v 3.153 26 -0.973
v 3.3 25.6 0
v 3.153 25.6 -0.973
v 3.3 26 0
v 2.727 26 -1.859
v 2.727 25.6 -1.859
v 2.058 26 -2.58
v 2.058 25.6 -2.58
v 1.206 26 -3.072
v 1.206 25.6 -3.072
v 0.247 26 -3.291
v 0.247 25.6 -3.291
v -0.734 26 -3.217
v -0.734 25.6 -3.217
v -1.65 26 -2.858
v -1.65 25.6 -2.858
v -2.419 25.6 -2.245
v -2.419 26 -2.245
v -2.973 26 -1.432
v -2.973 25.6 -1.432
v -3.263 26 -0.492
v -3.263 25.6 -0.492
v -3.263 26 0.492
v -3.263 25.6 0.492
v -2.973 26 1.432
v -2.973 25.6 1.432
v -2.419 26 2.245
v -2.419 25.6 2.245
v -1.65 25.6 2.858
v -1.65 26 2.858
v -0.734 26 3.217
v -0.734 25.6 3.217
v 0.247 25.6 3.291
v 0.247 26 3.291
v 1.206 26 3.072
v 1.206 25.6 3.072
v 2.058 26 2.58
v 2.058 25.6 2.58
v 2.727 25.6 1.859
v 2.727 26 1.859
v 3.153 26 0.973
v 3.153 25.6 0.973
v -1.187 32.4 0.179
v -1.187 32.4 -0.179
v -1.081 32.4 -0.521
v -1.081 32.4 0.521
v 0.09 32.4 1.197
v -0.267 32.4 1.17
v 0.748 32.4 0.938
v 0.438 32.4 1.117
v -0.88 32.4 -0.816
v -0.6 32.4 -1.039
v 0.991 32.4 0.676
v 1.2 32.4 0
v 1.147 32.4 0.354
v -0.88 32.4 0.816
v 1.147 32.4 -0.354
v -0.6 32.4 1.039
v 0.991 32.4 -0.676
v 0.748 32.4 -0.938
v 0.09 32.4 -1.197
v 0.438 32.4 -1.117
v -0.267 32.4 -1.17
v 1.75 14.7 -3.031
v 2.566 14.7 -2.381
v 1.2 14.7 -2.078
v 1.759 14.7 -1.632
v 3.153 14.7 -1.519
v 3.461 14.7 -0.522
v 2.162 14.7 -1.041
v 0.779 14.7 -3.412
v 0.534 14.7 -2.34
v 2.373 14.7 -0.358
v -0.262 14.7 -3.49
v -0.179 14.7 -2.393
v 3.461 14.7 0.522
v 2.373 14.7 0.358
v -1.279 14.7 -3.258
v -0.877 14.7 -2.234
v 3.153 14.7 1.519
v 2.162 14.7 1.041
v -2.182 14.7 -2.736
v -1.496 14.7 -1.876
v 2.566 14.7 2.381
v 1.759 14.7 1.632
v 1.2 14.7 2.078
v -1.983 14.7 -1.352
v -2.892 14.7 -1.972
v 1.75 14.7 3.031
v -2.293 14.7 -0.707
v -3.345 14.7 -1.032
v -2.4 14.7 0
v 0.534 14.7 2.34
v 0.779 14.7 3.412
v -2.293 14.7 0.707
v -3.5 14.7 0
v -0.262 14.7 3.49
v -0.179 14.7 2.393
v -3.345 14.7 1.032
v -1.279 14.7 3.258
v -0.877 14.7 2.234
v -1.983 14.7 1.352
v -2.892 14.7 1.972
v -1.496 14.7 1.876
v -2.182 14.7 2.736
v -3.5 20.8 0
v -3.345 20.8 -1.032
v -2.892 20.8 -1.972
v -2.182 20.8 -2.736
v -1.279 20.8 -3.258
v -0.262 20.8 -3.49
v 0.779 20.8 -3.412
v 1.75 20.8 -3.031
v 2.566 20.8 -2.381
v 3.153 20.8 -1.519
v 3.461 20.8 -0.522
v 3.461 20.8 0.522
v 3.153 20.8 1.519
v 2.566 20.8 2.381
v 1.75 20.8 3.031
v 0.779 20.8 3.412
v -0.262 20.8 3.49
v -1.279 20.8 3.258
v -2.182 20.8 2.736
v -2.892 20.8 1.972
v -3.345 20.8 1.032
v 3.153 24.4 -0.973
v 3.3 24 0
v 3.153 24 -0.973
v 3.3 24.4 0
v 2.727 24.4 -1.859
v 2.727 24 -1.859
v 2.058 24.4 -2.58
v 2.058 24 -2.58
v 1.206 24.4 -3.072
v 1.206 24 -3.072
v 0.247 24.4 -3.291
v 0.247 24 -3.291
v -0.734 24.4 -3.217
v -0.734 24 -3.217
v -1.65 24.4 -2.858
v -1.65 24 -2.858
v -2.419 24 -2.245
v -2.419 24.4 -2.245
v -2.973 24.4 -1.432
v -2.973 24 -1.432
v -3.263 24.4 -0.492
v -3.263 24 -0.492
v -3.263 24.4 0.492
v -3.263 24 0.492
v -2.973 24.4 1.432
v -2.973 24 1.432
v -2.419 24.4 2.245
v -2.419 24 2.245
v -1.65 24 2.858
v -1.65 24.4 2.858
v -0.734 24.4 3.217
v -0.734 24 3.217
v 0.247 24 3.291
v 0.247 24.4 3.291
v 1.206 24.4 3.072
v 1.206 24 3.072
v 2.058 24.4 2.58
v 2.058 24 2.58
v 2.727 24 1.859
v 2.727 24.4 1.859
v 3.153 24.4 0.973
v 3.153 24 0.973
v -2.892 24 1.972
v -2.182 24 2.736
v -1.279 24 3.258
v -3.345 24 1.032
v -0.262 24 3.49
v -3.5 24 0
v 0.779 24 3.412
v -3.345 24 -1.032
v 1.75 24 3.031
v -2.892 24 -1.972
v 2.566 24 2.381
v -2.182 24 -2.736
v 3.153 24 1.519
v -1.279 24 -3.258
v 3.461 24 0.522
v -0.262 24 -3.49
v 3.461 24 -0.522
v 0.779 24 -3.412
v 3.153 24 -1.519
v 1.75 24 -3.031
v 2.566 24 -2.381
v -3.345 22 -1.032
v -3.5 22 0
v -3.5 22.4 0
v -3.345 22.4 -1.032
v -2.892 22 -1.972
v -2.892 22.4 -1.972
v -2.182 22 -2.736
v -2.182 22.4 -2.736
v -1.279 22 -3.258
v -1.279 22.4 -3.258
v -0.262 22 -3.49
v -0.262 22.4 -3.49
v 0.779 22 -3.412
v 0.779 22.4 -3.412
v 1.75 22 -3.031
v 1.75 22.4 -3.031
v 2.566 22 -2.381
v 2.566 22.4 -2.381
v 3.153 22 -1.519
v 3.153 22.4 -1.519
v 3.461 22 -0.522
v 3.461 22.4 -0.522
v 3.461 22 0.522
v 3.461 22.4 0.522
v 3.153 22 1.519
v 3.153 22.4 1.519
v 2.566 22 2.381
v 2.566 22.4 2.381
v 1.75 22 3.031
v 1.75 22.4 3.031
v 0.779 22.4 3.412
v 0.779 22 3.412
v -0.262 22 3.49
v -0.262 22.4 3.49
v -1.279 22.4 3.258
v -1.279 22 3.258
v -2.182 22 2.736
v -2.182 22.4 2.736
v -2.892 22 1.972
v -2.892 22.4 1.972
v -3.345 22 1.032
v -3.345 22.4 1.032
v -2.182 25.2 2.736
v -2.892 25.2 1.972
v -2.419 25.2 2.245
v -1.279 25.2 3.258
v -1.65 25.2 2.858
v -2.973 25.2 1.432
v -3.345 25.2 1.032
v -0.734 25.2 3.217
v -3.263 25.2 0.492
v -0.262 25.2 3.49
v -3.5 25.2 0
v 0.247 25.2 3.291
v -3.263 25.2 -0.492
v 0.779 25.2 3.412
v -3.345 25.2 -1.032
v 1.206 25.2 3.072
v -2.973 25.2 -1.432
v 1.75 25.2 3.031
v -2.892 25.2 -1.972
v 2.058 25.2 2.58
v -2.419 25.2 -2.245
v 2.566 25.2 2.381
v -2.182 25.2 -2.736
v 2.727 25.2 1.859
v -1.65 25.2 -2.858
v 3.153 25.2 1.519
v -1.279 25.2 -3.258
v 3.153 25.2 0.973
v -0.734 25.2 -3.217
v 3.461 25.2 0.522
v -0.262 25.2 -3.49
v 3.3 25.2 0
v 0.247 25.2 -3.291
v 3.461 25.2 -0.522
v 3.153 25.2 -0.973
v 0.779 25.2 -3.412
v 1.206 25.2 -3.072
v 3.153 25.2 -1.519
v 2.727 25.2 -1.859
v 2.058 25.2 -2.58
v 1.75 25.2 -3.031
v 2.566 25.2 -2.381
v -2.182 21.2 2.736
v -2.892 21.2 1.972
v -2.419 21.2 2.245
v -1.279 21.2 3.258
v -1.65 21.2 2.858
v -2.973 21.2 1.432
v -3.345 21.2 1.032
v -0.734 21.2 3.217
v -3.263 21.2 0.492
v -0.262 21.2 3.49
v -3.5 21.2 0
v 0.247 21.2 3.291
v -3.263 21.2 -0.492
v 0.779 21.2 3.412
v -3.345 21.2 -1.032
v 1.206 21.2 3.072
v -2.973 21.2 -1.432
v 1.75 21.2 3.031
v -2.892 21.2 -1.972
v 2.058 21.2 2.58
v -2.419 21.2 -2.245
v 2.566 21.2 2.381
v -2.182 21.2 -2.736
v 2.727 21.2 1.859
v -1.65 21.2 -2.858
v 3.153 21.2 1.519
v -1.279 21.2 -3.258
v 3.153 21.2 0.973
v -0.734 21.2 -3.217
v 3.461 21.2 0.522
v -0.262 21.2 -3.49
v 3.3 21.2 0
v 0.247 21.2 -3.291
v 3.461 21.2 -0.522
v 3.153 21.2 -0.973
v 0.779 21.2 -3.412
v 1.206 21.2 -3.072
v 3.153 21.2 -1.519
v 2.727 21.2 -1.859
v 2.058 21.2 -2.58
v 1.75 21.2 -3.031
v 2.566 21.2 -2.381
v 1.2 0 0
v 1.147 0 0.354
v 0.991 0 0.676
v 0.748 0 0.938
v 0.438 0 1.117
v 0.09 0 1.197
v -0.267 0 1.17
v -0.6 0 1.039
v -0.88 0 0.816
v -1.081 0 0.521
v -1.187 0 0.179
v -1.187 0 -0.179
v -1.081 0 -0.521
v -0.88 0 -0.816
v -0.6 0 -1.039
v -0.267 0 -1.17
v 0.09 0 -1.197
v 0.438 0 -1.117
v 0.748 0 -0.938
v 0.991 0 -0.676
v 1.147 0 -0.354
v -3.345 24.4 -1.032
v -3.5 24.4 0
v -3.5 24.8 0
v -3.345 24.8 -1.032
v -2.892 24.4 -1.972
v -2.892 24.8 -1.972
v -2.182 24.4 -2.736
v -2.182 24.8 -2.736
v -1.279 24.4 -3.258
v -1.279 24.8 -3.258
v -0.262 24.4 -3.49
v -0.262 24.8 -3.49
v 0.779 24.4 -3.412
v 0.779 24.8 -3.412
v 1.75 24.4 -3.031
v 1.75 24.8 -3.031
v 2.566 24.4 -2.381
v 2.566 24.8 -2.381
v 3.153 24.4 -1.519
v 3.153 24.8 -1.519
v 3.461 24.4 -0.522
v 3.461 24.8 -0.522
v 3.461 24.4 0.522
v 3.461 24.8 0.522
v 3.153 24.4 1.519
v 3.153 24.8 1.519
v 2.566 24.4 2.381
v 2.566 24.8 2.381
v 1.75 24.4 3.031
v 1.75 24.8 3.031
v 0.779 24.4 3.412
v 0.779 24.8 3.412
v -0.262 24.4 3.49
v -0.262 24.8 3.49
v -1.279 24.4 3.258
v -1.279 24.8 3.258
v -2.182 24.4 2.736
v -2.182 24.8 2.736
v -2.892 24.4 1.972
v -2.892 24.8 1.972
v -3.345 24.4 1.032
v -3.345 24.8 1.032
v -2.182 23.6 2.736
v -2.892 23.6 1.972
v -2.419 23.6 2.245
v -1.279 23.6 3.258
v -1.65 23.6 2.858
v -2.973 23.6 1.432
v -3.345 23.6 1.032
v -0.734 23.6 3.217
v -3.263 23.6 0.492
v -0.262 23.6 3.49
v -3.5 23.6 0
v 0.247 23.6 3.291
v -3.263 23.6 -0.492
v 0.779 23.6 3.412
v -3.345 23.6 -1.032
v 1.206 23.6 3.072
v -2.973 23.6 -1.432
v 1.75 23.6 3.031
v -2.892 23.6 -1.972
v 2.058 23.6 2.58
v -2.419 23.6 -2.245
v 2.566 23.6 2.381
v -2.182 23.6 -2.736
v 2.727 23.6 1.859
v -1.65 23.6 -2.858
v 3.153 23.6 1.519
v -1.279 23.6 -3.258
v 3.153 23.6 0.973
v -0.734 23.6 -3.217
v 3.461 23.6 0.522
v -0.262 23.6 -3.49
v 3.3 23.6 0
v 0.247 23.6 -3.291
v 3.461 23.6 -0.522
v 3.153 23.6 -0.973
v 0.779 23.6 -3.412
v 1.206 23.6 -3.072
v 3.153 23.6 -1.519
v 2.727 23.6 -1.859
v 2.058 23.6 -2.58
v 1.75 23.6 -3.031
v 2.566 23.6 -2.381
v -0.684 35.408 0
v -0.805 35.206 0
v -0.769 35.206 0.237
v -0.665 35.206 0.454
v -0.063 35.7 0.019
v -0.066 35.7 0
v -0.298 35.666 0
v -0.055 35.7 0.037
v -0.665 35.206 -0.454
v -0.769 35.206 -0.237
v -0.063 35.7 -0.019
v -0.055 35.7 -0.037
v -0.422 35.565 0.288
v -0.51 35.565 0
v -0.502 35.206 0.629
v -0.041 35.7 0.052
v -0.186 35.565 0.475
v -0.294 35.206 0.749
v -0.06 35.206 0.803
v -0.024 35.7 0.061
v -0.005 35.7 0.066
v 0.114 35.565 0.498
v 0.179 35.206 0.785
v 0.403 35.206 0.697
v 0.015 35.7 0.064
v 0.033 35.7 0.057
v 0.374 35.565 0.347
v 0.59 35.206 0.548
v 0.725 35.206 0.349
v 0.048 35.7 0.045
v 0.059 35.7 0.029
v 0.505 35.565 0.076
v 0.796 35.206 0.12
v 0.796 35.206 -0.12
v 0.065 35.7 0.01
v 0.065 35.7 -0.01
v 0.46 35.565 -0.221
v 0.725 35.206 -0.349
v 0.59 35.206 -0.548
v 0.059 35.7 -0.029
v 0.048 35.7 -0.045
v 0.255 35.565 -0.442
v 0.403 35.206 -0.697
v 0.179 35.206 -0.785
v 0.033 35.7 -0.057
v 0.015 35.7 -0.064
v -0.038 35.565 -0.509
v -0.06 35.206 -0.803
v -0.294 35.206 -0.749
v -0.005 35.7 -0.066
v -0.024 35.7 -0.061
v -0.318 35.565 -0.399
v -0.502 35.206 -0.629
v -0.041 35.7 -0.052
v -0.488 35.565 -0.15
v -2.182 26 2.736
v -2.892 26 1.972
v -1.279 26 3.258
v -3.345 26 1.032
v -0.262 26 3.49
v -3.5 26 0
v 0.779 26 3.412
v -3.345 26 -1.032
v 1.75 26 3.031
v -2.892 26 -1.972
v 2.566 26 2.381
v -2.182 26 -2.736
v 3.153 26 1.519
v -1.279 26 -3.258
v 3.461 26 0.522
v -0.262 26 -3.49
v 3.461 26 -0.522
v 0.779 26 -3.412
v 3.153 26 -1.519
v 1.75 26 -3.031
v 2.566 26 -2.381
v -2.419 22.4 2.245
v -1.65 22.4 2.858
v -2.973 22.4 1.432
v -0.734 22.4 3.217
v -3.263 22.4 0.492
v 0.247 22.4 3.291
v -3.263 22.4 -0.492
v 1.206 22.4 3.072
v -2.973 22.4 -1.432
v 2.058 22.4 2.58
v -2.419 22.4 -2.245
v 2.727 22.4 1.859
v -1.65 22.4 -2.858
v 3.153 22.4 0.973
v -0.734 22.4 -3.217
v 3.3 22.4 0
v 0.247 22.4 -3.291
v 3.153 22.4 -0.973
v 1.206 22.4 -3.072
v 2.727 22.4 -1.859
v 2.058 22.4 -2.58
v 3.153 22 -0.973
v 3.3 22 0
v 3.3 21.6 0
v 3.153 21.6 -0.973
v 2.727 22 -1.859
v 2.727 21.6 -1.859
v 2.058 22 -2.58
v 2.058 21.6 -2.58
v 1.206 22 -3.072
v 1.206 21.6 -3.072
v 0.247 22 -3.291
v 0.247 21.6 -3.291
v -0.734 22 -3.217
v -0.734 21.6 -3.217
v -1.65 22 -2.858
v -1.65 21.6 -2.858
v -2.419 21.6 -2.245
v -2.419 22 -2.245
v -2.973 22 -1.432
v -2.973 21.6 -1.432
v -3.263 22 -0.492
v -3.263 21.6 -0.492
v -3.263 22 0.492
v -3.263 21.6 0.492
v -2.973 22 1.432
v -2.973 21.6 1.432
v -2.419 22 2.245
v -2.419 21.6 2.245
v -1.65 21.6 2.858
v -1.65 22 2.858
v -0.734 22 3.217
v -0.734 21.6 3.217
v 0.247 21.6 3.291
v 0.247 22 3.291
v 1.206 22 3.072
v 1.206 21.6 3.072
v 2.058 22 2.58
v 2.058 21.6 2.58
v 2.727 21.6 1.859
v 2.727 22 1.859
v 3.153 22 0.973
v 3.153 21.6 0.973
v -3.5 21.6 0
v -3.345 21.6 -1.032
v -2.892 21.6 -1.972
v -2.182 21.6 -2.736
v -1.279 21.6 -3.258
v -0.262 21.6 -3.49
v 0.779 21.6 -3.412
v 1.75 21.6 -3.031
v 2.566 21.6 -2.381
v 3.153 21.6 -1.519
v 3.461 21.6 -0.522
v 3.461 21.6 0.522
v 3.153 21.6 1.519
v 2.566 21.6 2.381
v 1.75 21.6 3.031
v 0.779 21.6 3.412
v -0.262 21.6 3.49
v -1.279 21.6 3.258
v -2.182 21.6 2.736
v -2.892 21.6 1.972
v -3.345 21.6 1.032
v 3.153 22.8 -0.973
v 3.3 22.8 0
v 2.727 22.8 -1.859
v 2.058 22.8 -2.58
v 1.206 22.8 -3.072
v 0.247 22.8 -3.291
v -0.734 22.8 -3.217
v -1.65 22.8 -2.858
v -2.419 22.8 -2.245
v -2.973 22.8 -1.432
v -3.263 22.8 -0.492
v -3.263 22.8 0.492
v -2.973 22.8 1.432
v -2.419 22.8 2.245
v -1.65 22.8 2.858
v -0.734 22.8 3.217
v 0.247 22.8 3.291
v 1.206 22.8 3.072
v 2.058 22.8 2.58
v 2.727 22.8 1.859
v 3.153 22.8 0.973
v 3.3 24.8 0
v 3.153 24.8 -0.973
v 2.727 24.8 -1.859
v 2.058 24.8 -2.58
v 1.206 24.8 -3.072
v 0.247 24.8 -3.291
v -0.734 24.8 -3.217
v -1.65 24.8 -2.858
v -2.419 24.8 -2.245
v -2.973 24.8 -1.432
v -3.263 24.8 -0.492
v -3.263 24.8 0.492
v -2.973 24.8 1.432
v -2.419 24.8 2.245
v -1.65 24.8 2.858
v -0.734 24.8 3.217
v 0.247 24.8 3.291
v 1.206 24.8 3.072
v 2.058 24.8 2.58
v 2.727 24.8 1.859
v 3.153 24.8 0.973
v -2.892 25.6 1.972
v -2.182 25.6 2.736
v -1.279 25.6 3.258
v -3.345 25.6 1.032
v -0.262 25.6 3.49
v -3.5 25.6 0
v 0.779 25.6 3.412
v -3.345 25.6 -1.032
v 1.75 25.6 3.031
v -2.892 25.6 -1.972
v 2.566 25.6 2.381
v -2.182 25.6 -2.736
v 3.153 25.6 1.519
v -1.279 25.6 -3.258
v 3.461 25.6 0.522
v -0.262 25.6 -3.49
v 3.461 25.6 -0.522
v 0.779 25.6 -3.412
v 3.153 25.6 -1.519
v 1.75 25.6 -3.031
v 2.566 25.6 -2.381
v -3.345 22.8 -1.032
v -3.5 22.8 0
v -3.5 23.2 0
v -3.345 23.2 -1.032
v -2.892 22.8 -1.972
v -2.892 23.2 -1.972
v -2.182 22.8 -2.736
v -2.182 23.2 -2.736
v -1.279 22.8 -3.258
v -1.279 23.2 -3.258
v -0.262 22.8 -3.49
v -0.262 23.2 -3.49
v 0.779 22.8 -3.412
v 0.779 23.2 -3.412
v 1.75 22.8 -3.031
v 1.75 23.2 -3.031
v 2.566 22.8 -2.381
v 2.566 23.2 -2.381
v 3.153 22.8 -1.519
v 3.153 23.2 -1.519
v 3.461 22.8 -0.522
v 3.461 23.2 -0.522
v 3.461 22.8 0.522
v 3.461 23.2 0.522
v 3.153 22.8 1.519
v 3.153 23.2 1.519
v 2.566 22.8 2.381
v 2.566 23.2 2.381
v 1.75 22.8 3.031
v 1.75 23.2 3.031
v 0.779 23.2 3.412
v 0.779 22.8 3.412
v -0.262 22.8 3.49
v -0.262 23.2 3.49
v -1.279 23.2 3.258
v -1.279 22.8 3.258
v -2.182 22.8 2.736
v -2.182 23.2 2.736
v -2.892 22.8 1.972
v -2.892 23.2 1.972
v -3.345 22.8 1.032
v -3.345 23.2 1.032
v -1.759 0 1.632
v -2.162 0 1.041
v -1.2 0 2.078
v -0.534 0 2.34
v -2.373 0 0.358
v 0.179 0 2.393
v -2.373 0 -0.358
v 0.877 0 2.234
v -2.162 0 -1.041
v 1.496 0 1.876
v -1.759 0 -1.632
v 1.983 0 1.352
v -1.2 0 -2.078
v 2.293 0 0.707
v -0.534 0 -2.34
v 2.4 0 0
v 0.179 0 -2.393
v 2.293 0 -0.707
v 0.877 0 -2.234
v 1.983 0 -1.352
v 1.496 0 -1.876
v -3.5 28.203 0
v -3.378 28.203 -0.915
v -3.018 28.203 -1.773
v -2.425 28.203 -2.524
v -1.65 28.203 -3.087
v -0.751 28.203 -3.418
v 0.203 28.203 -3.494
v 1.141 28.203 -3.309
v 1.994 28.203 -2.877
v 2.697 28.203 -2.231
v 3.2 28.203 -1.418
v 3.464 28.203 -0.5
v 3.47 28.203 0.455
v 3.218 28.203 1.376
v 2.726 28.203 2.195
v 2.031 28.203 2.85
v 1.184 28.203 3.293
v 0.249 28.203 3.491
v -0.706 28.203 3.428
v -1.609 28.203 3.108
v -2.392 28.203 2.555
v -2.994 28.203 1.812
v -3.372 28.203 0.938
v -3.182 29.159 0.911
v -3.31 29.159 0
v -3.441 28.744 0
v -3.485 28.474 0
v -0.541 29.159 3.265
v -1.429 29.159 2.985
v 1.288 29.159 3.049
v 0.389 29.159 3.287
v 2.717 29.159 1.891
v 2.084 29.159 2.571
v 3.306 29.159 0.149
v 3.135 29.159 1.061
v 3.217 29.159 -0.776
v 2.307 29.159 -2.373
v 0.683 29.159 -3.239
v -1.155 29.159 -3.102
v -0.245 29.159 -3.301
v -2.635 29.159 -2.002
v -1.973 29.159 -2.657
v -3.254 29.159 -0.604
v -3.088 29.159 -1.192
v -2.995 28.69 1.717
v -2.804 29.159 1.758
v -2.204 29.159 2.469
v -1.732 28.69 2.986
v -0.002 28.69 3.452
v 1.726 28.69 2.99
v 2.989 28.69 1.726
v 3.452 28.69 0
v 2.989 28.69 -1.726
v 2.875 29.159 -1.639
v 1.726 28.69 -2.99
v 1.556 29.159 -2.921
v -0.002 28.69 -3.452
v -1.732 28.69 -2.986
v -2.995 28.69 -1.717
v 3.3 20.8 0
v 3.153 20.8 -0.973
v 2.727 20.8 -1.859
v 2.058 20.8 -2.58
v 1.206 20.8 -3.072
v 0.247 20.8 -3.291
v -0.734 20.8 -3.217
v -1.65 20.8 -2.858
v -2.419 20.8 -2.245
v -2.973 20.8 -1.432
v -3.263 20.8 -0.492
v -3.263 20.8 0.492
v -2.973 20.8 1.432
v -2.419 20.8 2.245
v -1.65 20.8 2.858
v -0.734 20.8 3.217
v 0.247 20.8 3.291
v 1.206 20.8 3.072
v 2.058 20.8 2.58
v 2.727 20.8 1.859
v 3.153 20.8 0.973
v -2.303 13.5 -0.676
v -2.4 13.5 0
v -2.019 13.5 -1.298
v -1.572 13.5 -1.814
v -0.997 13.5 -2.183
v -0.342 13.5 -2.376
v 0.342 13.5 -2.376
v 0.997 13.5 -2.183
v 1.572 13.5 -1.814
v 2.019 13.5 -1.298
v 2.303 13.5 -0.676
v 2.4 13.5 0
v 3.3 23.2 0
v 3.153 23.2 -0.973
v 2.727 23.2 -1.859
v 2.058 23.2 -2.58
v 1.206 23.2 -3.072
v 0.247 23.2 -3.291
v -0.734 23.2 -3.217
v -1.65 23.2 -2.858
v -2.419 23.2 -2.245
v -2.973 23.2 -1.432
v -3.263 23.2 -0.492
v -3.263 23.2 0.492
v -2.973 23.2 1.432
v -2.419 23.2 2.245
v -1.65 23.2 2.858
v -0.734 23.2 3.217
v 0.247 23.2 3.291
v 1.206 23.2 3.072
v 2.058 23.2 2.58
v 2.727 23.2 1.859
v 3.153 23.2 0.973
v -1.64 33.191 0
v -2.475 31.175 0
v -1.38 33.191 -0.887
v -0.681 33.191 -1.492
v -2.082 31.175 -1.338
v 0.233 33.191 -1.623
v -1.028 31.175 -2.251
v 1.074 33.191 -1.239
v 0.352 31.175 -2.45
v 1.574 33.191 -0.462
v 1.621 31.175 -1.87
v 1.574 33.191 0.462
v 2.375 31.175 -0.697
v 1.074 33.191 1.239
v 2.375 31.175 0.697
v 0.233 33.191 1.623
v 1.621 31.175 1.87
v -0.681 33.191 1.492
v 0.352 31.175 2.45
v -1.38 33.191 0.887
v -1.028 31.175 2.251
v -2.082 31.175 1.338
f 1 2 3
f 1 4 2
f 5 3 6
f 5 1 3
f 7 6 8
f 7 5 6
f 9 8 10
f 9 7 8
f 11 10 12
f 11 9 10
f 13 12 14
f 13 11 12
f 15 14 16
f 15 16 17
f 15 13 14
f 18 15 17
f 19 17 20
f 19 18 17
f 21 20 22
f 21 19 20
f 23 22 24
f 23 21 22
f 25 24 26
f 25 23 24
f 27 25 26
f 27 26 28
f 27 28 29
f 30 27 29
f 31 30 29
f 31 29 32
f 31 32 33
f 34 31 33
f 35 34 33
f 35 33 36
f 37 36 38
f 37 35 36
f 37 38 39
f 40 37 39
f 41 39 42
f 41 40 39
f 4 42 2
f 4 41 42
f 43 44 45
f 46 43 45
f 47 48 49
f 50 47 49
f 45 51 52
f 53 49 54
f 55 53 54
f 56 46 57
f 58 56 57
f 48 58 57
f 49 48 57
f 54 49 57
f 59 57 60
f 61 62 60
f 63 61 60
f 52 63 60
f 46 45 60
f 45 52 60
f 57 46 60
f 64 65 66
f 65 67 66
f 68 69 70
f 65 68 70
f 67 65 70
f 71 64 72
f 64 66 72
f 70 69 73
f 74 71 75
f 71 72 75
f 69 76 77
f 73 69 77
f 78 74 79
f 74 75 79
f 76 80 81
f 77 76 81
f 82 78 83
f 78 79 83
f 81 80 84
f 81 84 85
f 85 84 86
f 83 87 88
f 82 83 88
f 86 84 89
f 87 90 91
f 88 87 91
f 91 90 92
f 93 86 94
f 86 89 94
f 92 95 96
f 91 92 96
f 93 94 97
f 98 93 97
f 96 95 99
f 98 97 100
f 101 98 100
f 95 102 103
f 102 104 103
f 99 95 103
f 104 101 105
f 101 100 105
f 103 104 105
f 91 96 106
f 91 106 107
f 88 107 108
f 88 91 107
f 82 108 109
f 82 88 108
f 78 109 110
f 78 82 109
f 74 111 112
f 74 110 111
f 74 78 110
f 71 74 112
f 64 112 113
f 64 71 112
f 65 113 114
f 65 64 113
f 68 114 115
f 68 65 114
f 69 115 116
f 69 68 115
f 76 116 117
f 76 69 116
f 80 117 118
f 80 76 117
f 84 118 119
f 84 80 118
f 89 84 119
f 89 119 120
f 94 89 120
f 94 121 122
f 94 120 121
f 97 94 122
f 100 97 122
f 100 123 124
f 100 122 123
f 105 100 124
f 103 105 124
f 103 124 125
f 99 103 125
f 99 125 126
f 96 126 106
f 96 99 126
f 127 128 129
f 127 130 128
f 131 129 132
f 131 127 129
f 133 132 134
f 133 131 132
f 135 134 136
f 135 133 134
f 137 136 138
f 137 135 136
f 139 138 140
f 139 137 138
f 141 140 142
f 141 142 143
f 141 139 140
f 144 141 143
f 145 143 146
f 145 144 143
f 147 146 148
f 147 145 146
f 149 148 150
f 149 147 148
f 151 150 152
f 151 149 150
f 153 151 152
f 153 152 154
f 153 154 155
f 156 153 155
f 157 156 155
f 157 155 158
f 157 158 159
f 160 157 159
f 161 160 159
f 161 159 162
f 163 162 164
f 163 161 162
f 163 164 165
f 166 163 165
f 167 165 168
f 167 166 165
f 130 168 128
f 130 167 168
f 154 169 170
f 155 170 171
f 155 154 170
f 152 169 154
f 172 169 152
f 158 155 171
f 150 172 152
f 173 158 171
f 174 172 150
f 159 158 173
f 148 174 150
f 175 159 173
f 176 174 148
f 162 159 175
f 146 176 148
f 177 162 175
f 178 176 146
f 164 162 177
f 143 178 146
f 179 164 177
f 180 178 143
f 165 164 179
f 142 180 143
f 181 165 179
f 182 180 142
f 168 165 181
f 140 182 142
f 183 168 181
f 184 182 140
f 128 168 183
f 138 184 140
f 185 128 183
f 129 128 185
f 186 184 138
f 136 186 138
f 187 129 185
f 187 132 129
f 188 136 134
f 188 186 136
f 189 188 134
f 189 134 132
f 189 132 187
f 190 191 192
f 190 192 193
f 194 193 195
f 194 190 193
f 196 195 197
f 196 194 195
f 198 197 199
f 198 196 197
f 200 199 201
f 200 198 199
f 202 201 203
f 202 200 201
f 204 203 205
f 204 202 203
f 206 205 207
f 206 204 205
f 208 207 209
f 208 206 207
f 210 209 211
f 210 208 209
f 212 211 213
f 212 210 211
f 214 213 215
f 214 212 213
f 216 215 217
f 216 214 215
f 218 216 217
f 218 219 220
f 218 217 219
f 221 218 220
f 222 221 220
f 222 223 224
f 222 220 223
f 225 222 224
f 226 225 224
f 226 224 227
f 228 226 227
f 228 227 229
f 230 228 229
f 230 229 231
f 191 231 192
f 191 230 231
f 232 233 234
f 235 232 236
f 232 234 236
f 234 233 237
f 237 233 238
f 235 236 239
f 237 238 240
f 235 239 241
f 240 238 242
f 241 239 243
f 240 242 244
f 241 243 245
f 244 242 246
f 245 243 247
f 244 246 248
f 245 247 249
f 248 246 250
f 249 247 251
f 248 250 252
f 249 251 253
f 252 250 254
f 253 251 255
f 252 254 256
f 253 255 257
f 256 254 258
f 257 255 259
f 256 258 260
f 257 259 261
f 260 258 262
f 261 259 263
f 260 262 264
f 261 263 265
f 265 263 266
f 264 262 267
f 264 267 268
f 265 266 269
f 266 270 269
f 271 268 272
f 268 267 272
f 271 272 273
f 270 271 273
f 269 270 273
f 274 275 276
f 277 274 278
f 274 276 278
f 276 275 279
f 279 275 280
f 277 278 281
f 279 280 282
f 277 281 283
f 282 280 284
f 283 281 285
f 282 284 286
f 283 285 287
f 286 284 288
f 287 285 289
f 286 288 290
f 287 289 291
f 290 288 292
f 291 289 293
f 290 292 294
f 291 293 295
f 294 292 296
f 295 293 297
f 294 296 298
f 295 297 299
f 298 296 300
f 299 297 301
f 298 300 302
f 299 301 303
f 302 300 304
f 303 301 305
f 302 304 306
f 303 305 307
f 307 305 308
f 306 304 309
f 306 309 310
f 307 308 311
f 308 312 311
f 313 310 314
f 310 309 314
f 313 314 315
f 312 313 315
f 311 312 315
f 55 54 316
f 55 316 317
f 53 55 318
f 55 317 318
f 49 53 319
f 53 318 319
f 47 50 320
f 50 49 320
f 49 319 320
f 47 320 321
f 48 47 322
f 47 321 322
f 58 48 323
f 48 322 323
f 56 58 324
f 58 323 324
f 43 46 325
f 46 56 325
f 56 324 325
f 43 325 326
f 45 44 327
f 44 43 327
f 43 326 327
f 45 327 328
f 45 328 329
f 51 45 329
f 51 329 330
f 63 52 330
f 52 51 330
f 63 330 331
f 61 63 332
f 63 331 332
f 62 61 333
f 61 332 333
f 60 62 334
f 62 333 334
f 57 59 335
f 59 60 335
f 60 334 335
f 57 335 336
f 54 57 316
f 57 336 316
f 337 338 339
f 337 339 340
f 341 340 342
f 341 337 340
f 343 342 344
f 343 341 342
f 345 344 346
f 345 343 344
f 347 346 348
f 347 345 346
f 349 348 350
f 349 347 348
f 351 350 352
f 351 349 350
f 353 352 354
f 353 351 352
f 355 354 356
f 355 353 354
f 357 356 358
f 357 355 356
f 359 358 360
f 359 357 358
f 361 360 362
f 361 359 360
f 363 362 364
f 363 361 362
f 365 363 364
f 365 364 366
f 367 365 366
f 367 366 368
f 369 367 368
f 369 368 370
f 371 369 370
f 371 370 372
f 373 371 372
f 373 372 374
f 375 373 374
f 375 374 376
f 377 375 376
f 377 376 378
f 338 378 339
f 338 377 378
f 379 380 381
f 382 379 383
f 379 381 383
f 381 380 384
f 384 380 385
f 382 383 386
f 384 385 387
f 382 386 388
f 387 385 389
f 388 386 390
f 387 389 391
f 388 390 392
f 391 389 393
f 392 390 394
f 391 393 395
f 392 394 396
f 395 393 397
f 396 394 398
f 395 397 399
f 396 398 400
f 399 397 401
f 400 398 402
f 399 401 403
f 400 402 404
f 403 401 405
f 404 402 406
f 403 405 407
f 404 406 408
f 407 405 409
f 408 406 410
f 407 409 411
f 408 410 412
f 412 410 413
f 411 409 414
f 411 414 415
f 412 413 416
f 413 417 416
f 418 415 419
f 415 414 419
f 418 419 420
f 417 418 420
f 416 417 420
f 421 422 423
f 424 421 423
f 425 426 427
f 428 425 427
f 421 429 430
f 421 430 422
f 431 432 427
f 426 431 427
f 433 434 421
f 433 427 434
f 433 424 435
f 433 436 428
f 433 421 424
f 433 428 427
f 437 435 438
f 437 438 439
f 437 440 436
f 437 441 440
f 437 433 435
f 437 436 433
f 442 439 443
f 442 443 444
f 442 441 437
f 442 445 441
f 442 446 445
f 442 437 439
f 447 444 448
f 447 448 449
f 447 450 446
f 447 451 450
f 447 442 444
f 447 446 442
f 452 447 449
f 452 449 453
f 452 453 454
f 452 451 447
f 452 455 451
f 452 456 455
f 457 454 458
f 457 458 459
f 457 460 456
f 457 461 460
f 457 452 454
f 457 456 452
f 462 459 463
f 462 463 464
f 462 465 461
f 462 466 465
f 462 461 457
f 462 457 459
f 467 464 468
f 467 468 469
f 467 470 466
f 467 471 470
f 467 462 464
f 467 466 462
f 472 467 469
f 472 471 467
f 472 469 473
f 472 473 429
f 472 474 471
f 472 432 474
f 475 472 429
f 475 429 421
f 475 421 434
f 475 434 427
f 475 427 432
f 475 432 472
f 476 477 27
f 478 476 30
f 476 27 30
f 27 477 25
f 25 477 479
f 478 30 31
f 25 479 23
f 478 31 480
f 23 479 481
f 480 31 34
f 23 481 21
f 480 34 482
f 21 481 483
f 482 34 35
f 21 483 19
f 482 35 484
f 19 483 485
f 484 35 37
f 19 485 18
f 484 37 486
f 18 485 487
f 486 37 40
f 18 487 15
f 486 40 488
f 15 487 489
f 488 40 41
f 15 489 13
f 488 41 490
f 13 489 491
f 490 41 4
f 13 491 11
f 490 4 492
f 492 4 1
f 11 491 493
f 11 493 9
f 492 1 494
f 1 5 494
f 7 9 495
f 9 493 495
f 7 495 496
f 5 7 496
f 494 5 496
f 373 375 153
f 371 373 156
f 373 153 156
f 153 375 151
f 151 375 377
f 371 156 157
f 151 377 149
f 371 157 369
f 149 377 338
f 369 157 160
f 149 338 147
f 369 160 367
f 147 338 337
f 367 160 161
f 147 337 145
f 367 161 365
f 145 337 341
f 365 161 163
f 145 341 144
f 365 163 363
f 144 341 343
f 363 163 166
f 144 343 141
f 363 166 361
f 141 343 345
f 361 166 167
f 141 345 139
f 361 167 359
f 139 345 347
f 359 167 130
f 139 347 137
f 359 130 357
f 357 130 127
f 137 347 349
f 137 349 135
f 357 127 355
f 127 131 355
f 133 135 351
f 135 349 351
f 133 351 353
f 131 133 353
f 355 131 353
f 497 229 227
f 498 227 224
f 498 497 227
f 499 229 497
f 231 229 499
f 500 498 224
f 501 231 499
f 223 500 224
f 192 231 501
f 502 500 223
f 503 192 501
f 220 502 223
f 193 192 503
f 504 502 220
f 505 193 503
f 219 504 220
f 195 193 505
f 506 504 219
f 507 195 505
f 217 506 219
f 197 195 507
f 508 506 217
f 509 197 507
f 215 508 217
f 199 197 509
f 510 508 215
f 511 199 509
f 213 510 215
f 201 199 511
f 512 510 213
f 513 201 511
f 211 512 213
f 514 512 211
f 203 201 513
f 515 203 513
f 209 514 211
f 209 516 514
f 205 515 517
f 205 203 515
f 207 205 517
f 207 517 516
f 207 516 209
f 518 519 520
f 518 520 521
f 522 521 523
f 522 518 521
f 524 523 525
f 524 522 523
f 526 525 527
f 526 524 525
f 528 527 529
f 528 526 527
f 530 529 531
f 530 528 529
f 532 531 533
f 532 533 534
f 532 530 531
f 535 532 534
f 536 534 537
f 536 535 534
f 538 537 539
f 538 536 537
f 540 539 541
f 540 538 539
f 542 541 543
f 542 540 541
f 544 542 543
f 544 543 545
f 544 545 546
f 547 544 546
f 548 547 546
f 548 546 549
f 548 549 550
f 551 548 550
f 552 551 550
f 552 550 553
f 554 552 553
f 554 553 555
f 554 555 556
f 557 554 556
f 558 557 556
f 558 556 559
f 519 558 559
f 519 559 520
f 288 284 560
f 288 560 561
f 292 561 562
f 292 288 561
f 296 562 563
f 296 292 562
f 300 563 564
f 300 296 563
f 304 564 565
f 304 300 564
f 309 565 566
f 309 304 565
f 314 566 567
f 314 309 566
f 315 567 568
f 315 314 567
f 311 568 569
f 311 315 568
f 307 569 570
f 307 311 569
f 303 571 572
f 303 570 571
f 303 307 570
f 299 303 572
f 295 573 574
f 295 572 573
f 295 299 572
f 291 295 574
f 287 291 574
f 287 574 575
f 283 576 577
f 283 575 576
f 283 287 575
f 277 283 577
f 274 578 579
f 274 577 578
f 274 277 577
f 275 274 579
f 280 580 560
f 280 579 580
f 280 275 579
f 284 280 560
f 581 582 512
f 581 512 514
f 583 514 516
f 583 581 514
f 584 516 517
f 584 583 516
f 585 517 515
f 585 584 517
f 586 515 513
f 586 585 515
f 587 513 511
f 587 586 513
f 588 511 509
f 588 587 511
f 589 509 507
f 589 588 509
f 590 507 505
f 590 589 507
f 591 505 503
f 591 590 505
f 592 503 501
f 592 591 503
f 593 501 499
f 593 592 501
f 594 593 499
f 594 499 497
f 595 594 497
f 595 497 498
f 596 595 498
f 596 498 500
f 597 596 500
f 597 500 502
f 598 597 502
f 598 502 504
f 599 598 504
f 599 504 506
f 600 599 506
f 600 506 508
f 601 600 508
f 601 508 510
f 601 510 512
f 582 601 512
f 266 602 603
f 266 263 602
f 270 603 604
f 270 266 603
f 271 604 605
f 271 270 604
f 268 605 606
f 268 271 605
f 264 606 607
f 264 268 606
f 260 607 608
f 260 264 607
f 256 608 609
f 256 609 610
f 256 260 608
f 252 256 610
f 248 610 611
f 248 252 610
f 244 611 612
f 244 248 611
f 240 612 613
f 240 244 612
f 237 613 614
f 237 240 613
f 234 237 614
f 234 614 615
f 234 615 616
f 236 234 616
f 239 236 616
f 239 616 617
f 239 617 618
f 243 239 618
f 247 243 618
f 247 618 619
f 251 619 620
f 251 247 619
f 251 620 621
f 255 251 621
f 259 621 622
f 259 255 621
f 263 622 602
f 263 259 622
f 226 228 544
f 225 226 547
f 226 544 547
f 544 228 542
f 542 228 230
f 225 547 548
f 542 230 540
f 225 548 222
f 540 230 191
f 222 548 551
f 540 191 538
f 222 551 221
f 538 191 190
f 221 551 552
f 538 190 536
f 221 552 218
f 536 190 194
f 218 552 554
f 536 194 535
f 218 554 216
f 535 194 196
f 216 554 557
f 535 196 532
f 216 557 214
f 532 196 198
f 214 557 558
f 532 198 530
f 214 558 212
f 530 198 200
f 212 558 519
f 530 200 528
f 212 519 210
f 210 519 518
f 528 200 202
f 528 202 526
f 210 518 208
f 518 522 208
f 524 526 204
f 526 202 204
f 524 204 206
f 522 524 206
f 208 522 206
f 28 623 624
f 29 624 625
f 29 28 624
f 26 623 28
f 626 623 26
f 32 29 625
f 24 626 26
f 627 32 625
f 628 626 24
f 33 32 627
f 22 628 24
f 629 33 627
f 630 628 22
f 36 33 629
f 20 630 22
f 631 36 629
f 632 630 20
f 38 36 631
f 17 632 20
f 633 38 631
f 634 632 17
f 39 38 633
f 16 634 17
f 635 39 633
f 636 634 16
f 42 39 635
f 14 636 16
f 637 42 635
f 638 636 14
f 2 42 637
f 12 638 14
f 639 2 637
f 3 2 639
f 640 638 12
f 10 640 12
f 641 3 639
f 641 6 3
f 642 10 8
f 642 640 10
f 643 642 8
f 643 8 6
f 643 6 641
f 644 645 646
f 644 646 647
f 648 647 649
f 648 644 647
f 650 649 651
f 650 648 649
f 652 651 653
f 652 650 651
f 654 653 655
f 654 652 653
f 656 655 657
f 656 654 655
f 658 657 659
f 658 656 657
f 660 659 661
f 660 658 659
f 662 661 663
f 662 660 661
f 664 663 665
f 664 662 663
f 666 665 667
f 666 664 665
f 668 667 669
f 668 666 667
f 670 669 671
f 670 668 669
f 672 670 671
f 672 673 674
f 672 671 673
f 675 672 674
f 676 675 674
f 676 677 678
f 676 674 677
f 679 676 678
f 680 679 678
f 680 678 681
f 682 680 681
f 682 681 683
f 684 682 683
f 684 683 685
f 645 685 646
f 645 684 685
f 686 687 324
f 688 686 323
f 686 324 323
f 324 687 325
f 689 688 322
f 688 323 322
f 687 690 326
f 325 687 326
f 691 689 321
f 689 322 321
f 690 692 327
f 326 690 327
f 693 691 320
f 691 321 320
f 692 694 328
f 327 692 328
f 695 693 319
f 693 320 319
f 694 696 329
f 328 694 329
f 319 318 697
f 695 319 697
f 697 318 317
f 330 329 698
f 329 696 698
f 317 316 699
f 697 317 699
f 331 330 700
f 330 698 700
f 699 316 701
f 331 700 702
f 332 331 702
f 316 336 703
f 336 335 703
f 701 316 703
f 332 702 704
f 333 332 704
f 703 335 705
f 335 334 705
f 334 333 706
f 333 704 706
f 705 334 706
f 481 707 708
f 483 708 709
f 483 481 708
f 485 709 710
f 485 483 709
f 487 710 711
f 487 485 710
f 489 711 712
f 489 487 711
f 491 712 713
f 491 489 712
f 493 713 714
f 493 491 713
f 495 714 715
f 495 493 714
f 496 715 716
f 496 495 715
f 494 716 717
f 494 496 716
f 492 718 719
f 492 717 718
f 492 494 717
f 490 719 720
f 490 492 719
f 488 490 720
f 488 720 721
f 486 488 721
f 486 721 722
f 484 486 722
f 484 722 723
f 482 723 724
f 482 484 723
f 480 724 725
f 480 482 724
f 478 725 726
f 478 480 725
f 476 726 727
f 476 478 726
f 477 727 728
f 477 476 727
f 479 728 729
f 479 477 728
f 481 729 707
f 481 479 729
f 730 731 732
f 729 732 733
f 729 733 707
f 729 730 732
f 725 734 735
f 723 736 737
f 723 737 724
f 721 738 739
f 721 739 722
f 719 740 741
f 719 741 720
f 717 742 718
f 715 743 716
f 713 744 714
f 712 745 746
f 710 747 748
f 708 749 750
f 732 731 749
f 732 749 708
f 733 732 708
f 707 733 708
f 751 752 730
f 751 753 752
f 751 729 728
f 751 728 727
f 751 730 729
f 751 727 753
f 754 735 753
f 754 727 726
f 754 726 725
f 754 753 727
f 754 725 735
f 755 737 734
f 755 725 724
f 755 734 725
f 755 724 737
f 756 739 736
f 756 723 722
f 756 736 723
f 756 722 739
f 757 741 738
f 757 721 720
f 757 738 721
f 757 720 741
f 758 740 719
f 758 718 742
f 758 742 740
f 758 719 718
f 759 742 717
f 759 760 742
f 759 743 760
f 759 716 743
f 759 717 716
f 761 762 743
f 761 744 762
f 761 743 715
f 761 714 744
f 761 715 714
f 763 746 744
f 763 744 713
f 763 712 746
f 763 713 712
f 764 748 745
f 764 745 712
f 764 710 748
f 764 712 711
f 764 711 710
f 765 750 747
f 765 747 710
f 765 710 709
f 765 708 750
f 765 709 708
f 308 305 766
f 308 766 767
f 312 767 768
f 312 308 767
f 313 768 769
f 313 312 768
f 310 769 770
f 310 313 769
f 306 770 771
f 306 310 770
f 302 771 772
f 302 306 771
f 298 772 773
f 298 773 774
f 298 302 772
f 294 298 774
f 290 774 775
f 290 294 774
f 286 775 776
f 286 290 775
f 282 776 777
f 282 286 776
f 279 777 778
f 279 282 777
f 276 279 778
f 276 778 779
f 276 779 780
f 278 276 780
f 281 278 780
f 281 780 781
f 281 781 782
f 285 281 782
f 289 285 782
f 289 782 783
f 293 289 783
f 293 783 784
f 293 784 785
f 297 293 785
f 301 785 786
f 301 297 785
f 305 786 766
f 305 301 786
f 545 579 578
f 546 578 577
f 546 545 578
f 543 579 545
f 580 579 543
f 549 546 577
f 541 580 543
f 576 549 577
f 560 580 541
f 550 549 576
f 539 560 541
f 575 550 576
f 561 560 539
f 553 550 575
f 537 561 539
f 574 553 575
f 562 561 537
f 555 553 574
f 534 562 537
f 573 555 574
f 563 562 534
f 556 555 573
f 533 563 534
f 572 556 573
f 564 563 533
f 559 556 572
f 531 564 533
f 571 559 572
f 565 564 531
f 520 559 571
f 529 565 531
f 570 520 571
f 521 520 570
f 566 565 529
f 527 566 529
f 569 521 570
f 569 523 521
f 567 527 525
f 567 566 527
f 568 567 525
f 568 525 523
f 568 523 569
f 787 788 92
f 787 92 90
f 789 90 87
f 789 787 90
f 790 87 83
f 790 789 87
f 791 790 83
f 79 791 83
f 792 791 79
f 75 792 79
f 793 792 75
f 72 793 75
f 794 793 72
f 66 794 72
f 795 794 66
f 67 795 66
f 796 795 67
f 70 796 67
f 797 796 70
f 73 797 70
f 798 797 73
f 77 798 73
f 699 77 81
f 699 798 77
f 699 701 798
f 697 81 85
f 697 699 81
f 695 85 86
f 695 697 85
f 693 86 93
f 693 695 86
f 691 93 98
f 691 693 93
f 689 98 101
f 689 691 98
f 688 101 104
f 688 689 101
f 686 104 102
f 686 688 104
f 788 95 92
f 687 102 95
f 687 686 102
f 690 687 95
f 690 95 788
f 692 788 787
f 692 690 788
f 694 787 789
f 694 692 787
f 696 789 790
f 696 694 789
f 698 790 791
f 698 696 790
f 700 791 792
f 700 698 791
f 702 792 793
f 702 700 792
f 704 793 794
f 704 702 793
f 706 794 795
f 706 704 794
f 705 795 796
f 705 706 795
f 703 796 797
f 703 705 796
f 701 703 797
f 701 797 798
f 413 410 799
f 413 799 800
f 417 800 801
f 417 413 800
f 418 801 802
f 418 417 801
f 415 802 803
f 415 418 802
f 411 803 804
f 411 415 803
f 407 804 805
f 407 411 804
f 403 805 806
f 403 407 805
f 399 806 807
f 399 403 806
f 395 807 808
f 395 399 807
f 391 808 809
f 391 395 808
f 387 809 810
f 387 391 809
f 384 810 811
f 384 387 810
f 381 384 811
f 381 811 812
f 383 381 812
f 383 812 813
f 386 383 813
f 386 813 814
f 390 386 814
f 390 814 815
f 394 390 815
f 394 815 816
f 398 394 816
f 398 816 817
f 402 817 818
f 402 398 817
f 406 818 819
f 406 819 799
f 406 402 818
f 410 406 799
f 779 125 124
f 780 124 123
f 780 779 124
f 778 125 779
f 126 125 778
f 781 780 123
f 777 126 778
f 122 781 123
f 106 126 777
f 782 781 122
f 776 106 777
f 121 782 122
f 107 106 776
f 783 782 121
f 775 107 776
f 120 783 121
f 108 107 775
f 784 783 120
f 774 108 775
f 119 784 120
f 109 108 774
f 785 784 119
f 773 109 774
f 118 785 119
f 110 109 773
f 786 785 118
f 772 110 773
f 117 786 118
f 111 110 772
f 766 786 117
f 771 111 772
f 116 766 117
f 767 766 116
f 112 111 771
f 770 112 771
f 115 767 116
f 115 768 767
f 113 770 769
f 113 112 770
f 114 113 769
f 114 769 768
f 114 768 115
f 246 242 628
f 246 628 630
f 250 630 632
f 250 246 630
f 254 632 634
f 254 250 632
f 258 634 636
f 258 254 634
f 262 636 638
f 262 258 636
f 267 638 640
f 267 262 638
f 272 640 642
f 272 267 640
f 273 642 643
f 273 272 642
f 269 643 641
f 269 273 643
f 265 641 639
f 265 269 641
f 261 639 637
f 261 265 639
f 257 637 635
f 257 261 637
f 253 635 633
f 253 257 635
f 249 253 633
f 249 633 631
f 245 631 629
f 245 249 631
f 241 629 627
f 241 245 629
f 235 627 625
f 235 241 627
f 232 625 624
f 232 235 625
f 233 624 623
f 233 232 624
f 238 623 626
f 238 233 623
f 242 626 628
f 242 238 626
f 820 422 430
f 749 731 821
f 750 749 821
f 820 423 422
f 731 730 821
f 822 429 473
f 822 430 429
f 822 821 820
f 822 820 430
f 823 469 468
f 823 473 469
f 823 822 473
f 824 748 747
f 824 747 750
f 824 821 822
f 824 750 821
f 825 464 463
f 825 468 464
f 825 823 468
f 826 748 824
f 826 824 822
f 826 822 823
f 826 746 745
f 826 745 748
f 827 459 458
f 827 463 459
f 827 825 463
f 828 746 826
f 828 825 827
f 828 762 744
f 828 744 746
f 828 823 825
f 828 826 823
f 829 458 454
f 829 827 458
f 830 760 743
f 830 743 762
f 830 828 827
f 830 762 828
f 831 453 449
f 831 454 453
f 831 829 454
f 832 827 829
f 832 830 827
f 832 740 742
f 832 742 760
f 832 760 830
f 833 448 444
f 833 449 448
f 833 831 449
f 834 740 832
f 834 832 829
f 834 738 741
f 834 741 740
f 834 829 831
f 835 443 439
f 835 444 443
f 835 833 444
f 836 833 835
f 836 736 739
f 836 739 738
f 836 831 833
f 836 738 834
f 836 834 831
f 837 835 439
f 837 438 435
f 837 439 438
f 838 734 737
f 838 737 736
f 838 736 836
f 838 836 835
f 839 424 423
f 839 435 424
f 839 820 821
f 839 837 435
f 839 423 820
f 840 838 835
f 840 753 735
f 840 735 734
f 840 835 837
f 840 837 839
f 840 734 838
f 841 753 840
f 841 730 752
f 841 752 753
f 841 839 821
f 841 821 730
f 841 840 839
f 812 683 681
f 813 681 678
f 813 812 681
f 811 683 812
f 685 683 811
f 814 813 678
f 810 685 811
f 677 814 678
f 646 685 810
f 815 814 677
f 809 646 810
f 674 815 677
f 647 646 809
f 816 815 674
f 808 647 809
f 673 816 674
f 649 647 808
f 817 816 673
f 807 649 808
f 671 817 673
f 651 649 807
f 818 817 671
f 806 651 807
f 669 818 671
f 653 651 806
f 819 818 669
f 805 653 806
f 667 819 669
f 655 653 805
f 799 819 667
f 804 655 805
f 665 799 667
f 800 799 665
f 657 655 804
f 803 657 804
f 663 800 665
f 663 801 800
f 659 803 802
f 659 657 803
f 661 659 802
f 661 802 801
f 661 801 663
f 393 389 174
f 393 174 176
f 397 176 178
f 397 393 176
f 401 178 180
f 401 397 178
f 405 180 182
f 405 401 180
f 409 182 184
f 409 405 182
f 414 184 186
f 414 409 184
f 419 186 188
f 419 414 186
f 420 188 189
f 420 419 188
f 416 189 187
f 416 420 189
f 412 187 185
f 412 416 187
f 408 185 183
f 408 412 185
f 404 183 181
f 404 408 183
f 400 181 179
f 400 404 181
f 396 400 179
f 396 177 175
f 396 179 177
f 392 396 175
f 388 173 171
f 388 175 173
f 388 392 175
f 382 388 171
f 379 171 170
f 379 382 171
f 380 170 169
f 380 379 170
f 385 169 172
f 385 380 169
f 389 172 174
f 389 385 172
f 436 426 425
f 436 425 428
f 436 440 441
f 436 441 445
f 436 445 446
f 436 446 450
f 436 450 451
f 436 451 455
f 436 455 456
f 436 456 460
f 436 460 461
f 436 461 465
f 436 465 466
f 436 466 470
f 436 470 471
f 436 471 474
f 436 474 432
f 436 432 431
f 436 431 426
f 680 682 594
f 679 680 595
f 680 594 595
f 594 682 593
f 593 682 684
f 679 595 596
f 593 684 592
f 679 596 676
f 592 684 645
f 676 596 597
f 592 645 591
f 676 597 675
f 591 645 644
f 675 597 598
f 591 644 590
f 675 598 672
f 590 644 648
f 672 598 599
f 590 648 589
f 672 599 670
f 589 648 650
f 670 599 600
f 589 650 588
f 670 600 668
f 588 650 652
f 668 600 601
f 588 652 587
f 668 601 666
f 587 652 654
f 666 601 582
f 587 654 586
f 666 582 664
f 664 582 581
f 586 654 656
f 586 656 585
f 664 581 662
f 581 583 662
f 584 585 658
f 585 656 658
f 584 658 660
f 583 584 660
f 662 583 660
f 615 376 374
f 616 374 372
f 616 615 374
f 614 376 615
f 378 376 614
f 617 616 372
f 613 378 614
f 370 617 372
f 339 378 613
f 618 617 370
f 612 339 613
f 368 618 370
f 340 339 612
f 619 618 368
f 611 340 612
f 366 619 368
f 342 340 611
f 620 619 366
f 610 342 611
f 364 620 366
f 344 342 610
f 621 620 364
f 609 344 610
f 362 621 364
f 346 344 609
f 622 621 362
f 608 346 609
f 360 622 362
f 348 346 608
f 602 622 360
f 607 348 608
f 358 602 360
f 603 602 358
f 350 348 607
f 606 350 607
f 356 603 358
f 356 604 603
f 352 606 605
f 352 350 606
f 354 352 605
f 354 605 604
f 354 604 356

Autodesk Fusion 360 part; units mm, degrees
sketch "Sketch1" plane through (0, 0, 0) normal (0, 1, 0) x (1, 0, 0)
  circle A0 centre (0, 0) radius 1.2
  circle A1 centre (0, 0) radius 2.4
  dimension "d1" = 2.4
  dimension "d2" = 1.2
extrude "Extrude1" add sketch "Sketch1" along normal blind 13.5
sketch "Sketch2" plane through (0, 13.5, 0) normal (0, 1, 0) x (-1, 0, 0)
  circle A0 centre (0, 0) radius 1.2
  circle A1 centre (0, 0) radius 2.4
  circle A2 centre (0, 0) radius 1.2
  circle A3 centre (0, 0) radius 2.4
extrude "Extrude2" add sketch "Sketch2" along normal blind 1.2 contours A0 A2 | A1 A3
sketch "Sketch3" plane through (0, 14.7, 0) normal (0, 1, 0) x (-1, 0, 0)
  circle A0 centre (0, 0) radius 2.4
  circle A1 centre (0, 0) radius 3.5
  dimension "d11" = 7
extrude "Extrude3" add sketch "Sketch3" along normal blind 14 contours A0 | A1
extrude "Extrude4" add 1 faces at (0.7915, 28.7, 0.6312) along direction (0, 1, 0) blind 7 draft -22.5
fillet "Fillet1" radius 0.8 1 faces at (-0.4122, 35.7, -0.15)
fillet "Fillet2" radius 2.5 1 edges at (3.2631, 28.7, -1.2657)
sketch "Sketch4" plane through (0, 14.7, 0) normal (0, -1, 0) x (1, 0, 0)
  circle A0 centre (0, 0) radius 3.5
  circle A1 centre (0, 0) radius 2.4
sketch "Sketch5" plane through (0, 0, 0) normal (0, 1, 0) x (1, 0, 0)
  circle A0 centre (0, 0) radius 3.5
  circle A1 centre (0, 0) radius 3.3
  dimension "d20" = 7
  dimension "d21" = 6.6
extrude "Extrude7" cut sketch "Sketch5" along normal blind 20.8 and the other way blind -21.2
extrude "Extrude8" cut sketch "Sketch5" along normal blind 21.6 and the other way blind -22
extrude "Extrude9" cut sketch "Sketch5" along normal blind 22.4 and the other way blind -22.8
extrude "Extrude10" cut sketch "Sketch5" along normal blind 23.2 and the other way blind -23.6
extrude "Extrude11" cut sketch "Sketch5" along normal blind 24 and the other way blind -24.4
extrude "Extrude12" cut sketch "Sketch5" along normal blind 24.8 and the other way blind -25.2
extrude "Extrude13" cut sketch "Sketch5" along normal blind 25.6 and the other way blind -26
extrude "Extrude15" cut sketch "Sketch1" along normal blind 32.4 contours A0
equation "d1 = ProbeDiameter + ProbeDeiameterClearence"
equation "d2 = WallThickness"
equation "d3 = ProbeLenght"
equation "d5 = WallThickness"
equation "ProbeDiameter = 2.4 mm"
equation "ProbeDeiameterClearence = 0 mm"
equation "ProbeLenght = 13.5 mm"
equation "WallThickness = 1.2 mm"
equation "RidgeBaseDist = 19.6 mm"
equation "RidgeDistIncrement = 0.4 mm"
equation "RidgeSecondDist = -19.2 mm"
equation "RidgeCutGap = -0.4 mm"
equation "d34 = RidgeBaseDist + ( 3 * RidgeDistIncrement )"
equation "d36 = RidgeSecondDist + ( 5 * RidgeCutGap )"
equation "d38 = RidgeBaseDist + ( 5 * RidgeDistIncrement )"
equation "d40 = RidgeSecondDist + ( 7 * RidgeCutGap )"
equation "d42 = RidgeBaseDist + ( 7 * RidgeDistIncrement )"
equation "d44 = RidgeSecondDist + ( 9 * RidgeCutGap )"
equation "d46 = RidgeBaseDist + ( 9 * RidgeDistIncrement )"
equation "d48 = RidgeSecondDist + ( 11 * RidgeCutGap )"
equation "d50 = RidgeBaseDist + ( 11 * RidgeDistIncrement )"
equation "d52 = RidgeSecondDist + ( 13 * RidgeCutGap )"
equation "d54 = RidgeBaseDist + ( 13 * RidgeDistIncrement )"
equation "d56 = RidgeSecondDist + ( 15 * RidgeCutGap )"
equation "d58 = RidgeBaseDist + ( 15 * RidgeDistIncrement )"
equation "d60 = RidgeSecondDist + ( 17 * RidgeCutGap )"
